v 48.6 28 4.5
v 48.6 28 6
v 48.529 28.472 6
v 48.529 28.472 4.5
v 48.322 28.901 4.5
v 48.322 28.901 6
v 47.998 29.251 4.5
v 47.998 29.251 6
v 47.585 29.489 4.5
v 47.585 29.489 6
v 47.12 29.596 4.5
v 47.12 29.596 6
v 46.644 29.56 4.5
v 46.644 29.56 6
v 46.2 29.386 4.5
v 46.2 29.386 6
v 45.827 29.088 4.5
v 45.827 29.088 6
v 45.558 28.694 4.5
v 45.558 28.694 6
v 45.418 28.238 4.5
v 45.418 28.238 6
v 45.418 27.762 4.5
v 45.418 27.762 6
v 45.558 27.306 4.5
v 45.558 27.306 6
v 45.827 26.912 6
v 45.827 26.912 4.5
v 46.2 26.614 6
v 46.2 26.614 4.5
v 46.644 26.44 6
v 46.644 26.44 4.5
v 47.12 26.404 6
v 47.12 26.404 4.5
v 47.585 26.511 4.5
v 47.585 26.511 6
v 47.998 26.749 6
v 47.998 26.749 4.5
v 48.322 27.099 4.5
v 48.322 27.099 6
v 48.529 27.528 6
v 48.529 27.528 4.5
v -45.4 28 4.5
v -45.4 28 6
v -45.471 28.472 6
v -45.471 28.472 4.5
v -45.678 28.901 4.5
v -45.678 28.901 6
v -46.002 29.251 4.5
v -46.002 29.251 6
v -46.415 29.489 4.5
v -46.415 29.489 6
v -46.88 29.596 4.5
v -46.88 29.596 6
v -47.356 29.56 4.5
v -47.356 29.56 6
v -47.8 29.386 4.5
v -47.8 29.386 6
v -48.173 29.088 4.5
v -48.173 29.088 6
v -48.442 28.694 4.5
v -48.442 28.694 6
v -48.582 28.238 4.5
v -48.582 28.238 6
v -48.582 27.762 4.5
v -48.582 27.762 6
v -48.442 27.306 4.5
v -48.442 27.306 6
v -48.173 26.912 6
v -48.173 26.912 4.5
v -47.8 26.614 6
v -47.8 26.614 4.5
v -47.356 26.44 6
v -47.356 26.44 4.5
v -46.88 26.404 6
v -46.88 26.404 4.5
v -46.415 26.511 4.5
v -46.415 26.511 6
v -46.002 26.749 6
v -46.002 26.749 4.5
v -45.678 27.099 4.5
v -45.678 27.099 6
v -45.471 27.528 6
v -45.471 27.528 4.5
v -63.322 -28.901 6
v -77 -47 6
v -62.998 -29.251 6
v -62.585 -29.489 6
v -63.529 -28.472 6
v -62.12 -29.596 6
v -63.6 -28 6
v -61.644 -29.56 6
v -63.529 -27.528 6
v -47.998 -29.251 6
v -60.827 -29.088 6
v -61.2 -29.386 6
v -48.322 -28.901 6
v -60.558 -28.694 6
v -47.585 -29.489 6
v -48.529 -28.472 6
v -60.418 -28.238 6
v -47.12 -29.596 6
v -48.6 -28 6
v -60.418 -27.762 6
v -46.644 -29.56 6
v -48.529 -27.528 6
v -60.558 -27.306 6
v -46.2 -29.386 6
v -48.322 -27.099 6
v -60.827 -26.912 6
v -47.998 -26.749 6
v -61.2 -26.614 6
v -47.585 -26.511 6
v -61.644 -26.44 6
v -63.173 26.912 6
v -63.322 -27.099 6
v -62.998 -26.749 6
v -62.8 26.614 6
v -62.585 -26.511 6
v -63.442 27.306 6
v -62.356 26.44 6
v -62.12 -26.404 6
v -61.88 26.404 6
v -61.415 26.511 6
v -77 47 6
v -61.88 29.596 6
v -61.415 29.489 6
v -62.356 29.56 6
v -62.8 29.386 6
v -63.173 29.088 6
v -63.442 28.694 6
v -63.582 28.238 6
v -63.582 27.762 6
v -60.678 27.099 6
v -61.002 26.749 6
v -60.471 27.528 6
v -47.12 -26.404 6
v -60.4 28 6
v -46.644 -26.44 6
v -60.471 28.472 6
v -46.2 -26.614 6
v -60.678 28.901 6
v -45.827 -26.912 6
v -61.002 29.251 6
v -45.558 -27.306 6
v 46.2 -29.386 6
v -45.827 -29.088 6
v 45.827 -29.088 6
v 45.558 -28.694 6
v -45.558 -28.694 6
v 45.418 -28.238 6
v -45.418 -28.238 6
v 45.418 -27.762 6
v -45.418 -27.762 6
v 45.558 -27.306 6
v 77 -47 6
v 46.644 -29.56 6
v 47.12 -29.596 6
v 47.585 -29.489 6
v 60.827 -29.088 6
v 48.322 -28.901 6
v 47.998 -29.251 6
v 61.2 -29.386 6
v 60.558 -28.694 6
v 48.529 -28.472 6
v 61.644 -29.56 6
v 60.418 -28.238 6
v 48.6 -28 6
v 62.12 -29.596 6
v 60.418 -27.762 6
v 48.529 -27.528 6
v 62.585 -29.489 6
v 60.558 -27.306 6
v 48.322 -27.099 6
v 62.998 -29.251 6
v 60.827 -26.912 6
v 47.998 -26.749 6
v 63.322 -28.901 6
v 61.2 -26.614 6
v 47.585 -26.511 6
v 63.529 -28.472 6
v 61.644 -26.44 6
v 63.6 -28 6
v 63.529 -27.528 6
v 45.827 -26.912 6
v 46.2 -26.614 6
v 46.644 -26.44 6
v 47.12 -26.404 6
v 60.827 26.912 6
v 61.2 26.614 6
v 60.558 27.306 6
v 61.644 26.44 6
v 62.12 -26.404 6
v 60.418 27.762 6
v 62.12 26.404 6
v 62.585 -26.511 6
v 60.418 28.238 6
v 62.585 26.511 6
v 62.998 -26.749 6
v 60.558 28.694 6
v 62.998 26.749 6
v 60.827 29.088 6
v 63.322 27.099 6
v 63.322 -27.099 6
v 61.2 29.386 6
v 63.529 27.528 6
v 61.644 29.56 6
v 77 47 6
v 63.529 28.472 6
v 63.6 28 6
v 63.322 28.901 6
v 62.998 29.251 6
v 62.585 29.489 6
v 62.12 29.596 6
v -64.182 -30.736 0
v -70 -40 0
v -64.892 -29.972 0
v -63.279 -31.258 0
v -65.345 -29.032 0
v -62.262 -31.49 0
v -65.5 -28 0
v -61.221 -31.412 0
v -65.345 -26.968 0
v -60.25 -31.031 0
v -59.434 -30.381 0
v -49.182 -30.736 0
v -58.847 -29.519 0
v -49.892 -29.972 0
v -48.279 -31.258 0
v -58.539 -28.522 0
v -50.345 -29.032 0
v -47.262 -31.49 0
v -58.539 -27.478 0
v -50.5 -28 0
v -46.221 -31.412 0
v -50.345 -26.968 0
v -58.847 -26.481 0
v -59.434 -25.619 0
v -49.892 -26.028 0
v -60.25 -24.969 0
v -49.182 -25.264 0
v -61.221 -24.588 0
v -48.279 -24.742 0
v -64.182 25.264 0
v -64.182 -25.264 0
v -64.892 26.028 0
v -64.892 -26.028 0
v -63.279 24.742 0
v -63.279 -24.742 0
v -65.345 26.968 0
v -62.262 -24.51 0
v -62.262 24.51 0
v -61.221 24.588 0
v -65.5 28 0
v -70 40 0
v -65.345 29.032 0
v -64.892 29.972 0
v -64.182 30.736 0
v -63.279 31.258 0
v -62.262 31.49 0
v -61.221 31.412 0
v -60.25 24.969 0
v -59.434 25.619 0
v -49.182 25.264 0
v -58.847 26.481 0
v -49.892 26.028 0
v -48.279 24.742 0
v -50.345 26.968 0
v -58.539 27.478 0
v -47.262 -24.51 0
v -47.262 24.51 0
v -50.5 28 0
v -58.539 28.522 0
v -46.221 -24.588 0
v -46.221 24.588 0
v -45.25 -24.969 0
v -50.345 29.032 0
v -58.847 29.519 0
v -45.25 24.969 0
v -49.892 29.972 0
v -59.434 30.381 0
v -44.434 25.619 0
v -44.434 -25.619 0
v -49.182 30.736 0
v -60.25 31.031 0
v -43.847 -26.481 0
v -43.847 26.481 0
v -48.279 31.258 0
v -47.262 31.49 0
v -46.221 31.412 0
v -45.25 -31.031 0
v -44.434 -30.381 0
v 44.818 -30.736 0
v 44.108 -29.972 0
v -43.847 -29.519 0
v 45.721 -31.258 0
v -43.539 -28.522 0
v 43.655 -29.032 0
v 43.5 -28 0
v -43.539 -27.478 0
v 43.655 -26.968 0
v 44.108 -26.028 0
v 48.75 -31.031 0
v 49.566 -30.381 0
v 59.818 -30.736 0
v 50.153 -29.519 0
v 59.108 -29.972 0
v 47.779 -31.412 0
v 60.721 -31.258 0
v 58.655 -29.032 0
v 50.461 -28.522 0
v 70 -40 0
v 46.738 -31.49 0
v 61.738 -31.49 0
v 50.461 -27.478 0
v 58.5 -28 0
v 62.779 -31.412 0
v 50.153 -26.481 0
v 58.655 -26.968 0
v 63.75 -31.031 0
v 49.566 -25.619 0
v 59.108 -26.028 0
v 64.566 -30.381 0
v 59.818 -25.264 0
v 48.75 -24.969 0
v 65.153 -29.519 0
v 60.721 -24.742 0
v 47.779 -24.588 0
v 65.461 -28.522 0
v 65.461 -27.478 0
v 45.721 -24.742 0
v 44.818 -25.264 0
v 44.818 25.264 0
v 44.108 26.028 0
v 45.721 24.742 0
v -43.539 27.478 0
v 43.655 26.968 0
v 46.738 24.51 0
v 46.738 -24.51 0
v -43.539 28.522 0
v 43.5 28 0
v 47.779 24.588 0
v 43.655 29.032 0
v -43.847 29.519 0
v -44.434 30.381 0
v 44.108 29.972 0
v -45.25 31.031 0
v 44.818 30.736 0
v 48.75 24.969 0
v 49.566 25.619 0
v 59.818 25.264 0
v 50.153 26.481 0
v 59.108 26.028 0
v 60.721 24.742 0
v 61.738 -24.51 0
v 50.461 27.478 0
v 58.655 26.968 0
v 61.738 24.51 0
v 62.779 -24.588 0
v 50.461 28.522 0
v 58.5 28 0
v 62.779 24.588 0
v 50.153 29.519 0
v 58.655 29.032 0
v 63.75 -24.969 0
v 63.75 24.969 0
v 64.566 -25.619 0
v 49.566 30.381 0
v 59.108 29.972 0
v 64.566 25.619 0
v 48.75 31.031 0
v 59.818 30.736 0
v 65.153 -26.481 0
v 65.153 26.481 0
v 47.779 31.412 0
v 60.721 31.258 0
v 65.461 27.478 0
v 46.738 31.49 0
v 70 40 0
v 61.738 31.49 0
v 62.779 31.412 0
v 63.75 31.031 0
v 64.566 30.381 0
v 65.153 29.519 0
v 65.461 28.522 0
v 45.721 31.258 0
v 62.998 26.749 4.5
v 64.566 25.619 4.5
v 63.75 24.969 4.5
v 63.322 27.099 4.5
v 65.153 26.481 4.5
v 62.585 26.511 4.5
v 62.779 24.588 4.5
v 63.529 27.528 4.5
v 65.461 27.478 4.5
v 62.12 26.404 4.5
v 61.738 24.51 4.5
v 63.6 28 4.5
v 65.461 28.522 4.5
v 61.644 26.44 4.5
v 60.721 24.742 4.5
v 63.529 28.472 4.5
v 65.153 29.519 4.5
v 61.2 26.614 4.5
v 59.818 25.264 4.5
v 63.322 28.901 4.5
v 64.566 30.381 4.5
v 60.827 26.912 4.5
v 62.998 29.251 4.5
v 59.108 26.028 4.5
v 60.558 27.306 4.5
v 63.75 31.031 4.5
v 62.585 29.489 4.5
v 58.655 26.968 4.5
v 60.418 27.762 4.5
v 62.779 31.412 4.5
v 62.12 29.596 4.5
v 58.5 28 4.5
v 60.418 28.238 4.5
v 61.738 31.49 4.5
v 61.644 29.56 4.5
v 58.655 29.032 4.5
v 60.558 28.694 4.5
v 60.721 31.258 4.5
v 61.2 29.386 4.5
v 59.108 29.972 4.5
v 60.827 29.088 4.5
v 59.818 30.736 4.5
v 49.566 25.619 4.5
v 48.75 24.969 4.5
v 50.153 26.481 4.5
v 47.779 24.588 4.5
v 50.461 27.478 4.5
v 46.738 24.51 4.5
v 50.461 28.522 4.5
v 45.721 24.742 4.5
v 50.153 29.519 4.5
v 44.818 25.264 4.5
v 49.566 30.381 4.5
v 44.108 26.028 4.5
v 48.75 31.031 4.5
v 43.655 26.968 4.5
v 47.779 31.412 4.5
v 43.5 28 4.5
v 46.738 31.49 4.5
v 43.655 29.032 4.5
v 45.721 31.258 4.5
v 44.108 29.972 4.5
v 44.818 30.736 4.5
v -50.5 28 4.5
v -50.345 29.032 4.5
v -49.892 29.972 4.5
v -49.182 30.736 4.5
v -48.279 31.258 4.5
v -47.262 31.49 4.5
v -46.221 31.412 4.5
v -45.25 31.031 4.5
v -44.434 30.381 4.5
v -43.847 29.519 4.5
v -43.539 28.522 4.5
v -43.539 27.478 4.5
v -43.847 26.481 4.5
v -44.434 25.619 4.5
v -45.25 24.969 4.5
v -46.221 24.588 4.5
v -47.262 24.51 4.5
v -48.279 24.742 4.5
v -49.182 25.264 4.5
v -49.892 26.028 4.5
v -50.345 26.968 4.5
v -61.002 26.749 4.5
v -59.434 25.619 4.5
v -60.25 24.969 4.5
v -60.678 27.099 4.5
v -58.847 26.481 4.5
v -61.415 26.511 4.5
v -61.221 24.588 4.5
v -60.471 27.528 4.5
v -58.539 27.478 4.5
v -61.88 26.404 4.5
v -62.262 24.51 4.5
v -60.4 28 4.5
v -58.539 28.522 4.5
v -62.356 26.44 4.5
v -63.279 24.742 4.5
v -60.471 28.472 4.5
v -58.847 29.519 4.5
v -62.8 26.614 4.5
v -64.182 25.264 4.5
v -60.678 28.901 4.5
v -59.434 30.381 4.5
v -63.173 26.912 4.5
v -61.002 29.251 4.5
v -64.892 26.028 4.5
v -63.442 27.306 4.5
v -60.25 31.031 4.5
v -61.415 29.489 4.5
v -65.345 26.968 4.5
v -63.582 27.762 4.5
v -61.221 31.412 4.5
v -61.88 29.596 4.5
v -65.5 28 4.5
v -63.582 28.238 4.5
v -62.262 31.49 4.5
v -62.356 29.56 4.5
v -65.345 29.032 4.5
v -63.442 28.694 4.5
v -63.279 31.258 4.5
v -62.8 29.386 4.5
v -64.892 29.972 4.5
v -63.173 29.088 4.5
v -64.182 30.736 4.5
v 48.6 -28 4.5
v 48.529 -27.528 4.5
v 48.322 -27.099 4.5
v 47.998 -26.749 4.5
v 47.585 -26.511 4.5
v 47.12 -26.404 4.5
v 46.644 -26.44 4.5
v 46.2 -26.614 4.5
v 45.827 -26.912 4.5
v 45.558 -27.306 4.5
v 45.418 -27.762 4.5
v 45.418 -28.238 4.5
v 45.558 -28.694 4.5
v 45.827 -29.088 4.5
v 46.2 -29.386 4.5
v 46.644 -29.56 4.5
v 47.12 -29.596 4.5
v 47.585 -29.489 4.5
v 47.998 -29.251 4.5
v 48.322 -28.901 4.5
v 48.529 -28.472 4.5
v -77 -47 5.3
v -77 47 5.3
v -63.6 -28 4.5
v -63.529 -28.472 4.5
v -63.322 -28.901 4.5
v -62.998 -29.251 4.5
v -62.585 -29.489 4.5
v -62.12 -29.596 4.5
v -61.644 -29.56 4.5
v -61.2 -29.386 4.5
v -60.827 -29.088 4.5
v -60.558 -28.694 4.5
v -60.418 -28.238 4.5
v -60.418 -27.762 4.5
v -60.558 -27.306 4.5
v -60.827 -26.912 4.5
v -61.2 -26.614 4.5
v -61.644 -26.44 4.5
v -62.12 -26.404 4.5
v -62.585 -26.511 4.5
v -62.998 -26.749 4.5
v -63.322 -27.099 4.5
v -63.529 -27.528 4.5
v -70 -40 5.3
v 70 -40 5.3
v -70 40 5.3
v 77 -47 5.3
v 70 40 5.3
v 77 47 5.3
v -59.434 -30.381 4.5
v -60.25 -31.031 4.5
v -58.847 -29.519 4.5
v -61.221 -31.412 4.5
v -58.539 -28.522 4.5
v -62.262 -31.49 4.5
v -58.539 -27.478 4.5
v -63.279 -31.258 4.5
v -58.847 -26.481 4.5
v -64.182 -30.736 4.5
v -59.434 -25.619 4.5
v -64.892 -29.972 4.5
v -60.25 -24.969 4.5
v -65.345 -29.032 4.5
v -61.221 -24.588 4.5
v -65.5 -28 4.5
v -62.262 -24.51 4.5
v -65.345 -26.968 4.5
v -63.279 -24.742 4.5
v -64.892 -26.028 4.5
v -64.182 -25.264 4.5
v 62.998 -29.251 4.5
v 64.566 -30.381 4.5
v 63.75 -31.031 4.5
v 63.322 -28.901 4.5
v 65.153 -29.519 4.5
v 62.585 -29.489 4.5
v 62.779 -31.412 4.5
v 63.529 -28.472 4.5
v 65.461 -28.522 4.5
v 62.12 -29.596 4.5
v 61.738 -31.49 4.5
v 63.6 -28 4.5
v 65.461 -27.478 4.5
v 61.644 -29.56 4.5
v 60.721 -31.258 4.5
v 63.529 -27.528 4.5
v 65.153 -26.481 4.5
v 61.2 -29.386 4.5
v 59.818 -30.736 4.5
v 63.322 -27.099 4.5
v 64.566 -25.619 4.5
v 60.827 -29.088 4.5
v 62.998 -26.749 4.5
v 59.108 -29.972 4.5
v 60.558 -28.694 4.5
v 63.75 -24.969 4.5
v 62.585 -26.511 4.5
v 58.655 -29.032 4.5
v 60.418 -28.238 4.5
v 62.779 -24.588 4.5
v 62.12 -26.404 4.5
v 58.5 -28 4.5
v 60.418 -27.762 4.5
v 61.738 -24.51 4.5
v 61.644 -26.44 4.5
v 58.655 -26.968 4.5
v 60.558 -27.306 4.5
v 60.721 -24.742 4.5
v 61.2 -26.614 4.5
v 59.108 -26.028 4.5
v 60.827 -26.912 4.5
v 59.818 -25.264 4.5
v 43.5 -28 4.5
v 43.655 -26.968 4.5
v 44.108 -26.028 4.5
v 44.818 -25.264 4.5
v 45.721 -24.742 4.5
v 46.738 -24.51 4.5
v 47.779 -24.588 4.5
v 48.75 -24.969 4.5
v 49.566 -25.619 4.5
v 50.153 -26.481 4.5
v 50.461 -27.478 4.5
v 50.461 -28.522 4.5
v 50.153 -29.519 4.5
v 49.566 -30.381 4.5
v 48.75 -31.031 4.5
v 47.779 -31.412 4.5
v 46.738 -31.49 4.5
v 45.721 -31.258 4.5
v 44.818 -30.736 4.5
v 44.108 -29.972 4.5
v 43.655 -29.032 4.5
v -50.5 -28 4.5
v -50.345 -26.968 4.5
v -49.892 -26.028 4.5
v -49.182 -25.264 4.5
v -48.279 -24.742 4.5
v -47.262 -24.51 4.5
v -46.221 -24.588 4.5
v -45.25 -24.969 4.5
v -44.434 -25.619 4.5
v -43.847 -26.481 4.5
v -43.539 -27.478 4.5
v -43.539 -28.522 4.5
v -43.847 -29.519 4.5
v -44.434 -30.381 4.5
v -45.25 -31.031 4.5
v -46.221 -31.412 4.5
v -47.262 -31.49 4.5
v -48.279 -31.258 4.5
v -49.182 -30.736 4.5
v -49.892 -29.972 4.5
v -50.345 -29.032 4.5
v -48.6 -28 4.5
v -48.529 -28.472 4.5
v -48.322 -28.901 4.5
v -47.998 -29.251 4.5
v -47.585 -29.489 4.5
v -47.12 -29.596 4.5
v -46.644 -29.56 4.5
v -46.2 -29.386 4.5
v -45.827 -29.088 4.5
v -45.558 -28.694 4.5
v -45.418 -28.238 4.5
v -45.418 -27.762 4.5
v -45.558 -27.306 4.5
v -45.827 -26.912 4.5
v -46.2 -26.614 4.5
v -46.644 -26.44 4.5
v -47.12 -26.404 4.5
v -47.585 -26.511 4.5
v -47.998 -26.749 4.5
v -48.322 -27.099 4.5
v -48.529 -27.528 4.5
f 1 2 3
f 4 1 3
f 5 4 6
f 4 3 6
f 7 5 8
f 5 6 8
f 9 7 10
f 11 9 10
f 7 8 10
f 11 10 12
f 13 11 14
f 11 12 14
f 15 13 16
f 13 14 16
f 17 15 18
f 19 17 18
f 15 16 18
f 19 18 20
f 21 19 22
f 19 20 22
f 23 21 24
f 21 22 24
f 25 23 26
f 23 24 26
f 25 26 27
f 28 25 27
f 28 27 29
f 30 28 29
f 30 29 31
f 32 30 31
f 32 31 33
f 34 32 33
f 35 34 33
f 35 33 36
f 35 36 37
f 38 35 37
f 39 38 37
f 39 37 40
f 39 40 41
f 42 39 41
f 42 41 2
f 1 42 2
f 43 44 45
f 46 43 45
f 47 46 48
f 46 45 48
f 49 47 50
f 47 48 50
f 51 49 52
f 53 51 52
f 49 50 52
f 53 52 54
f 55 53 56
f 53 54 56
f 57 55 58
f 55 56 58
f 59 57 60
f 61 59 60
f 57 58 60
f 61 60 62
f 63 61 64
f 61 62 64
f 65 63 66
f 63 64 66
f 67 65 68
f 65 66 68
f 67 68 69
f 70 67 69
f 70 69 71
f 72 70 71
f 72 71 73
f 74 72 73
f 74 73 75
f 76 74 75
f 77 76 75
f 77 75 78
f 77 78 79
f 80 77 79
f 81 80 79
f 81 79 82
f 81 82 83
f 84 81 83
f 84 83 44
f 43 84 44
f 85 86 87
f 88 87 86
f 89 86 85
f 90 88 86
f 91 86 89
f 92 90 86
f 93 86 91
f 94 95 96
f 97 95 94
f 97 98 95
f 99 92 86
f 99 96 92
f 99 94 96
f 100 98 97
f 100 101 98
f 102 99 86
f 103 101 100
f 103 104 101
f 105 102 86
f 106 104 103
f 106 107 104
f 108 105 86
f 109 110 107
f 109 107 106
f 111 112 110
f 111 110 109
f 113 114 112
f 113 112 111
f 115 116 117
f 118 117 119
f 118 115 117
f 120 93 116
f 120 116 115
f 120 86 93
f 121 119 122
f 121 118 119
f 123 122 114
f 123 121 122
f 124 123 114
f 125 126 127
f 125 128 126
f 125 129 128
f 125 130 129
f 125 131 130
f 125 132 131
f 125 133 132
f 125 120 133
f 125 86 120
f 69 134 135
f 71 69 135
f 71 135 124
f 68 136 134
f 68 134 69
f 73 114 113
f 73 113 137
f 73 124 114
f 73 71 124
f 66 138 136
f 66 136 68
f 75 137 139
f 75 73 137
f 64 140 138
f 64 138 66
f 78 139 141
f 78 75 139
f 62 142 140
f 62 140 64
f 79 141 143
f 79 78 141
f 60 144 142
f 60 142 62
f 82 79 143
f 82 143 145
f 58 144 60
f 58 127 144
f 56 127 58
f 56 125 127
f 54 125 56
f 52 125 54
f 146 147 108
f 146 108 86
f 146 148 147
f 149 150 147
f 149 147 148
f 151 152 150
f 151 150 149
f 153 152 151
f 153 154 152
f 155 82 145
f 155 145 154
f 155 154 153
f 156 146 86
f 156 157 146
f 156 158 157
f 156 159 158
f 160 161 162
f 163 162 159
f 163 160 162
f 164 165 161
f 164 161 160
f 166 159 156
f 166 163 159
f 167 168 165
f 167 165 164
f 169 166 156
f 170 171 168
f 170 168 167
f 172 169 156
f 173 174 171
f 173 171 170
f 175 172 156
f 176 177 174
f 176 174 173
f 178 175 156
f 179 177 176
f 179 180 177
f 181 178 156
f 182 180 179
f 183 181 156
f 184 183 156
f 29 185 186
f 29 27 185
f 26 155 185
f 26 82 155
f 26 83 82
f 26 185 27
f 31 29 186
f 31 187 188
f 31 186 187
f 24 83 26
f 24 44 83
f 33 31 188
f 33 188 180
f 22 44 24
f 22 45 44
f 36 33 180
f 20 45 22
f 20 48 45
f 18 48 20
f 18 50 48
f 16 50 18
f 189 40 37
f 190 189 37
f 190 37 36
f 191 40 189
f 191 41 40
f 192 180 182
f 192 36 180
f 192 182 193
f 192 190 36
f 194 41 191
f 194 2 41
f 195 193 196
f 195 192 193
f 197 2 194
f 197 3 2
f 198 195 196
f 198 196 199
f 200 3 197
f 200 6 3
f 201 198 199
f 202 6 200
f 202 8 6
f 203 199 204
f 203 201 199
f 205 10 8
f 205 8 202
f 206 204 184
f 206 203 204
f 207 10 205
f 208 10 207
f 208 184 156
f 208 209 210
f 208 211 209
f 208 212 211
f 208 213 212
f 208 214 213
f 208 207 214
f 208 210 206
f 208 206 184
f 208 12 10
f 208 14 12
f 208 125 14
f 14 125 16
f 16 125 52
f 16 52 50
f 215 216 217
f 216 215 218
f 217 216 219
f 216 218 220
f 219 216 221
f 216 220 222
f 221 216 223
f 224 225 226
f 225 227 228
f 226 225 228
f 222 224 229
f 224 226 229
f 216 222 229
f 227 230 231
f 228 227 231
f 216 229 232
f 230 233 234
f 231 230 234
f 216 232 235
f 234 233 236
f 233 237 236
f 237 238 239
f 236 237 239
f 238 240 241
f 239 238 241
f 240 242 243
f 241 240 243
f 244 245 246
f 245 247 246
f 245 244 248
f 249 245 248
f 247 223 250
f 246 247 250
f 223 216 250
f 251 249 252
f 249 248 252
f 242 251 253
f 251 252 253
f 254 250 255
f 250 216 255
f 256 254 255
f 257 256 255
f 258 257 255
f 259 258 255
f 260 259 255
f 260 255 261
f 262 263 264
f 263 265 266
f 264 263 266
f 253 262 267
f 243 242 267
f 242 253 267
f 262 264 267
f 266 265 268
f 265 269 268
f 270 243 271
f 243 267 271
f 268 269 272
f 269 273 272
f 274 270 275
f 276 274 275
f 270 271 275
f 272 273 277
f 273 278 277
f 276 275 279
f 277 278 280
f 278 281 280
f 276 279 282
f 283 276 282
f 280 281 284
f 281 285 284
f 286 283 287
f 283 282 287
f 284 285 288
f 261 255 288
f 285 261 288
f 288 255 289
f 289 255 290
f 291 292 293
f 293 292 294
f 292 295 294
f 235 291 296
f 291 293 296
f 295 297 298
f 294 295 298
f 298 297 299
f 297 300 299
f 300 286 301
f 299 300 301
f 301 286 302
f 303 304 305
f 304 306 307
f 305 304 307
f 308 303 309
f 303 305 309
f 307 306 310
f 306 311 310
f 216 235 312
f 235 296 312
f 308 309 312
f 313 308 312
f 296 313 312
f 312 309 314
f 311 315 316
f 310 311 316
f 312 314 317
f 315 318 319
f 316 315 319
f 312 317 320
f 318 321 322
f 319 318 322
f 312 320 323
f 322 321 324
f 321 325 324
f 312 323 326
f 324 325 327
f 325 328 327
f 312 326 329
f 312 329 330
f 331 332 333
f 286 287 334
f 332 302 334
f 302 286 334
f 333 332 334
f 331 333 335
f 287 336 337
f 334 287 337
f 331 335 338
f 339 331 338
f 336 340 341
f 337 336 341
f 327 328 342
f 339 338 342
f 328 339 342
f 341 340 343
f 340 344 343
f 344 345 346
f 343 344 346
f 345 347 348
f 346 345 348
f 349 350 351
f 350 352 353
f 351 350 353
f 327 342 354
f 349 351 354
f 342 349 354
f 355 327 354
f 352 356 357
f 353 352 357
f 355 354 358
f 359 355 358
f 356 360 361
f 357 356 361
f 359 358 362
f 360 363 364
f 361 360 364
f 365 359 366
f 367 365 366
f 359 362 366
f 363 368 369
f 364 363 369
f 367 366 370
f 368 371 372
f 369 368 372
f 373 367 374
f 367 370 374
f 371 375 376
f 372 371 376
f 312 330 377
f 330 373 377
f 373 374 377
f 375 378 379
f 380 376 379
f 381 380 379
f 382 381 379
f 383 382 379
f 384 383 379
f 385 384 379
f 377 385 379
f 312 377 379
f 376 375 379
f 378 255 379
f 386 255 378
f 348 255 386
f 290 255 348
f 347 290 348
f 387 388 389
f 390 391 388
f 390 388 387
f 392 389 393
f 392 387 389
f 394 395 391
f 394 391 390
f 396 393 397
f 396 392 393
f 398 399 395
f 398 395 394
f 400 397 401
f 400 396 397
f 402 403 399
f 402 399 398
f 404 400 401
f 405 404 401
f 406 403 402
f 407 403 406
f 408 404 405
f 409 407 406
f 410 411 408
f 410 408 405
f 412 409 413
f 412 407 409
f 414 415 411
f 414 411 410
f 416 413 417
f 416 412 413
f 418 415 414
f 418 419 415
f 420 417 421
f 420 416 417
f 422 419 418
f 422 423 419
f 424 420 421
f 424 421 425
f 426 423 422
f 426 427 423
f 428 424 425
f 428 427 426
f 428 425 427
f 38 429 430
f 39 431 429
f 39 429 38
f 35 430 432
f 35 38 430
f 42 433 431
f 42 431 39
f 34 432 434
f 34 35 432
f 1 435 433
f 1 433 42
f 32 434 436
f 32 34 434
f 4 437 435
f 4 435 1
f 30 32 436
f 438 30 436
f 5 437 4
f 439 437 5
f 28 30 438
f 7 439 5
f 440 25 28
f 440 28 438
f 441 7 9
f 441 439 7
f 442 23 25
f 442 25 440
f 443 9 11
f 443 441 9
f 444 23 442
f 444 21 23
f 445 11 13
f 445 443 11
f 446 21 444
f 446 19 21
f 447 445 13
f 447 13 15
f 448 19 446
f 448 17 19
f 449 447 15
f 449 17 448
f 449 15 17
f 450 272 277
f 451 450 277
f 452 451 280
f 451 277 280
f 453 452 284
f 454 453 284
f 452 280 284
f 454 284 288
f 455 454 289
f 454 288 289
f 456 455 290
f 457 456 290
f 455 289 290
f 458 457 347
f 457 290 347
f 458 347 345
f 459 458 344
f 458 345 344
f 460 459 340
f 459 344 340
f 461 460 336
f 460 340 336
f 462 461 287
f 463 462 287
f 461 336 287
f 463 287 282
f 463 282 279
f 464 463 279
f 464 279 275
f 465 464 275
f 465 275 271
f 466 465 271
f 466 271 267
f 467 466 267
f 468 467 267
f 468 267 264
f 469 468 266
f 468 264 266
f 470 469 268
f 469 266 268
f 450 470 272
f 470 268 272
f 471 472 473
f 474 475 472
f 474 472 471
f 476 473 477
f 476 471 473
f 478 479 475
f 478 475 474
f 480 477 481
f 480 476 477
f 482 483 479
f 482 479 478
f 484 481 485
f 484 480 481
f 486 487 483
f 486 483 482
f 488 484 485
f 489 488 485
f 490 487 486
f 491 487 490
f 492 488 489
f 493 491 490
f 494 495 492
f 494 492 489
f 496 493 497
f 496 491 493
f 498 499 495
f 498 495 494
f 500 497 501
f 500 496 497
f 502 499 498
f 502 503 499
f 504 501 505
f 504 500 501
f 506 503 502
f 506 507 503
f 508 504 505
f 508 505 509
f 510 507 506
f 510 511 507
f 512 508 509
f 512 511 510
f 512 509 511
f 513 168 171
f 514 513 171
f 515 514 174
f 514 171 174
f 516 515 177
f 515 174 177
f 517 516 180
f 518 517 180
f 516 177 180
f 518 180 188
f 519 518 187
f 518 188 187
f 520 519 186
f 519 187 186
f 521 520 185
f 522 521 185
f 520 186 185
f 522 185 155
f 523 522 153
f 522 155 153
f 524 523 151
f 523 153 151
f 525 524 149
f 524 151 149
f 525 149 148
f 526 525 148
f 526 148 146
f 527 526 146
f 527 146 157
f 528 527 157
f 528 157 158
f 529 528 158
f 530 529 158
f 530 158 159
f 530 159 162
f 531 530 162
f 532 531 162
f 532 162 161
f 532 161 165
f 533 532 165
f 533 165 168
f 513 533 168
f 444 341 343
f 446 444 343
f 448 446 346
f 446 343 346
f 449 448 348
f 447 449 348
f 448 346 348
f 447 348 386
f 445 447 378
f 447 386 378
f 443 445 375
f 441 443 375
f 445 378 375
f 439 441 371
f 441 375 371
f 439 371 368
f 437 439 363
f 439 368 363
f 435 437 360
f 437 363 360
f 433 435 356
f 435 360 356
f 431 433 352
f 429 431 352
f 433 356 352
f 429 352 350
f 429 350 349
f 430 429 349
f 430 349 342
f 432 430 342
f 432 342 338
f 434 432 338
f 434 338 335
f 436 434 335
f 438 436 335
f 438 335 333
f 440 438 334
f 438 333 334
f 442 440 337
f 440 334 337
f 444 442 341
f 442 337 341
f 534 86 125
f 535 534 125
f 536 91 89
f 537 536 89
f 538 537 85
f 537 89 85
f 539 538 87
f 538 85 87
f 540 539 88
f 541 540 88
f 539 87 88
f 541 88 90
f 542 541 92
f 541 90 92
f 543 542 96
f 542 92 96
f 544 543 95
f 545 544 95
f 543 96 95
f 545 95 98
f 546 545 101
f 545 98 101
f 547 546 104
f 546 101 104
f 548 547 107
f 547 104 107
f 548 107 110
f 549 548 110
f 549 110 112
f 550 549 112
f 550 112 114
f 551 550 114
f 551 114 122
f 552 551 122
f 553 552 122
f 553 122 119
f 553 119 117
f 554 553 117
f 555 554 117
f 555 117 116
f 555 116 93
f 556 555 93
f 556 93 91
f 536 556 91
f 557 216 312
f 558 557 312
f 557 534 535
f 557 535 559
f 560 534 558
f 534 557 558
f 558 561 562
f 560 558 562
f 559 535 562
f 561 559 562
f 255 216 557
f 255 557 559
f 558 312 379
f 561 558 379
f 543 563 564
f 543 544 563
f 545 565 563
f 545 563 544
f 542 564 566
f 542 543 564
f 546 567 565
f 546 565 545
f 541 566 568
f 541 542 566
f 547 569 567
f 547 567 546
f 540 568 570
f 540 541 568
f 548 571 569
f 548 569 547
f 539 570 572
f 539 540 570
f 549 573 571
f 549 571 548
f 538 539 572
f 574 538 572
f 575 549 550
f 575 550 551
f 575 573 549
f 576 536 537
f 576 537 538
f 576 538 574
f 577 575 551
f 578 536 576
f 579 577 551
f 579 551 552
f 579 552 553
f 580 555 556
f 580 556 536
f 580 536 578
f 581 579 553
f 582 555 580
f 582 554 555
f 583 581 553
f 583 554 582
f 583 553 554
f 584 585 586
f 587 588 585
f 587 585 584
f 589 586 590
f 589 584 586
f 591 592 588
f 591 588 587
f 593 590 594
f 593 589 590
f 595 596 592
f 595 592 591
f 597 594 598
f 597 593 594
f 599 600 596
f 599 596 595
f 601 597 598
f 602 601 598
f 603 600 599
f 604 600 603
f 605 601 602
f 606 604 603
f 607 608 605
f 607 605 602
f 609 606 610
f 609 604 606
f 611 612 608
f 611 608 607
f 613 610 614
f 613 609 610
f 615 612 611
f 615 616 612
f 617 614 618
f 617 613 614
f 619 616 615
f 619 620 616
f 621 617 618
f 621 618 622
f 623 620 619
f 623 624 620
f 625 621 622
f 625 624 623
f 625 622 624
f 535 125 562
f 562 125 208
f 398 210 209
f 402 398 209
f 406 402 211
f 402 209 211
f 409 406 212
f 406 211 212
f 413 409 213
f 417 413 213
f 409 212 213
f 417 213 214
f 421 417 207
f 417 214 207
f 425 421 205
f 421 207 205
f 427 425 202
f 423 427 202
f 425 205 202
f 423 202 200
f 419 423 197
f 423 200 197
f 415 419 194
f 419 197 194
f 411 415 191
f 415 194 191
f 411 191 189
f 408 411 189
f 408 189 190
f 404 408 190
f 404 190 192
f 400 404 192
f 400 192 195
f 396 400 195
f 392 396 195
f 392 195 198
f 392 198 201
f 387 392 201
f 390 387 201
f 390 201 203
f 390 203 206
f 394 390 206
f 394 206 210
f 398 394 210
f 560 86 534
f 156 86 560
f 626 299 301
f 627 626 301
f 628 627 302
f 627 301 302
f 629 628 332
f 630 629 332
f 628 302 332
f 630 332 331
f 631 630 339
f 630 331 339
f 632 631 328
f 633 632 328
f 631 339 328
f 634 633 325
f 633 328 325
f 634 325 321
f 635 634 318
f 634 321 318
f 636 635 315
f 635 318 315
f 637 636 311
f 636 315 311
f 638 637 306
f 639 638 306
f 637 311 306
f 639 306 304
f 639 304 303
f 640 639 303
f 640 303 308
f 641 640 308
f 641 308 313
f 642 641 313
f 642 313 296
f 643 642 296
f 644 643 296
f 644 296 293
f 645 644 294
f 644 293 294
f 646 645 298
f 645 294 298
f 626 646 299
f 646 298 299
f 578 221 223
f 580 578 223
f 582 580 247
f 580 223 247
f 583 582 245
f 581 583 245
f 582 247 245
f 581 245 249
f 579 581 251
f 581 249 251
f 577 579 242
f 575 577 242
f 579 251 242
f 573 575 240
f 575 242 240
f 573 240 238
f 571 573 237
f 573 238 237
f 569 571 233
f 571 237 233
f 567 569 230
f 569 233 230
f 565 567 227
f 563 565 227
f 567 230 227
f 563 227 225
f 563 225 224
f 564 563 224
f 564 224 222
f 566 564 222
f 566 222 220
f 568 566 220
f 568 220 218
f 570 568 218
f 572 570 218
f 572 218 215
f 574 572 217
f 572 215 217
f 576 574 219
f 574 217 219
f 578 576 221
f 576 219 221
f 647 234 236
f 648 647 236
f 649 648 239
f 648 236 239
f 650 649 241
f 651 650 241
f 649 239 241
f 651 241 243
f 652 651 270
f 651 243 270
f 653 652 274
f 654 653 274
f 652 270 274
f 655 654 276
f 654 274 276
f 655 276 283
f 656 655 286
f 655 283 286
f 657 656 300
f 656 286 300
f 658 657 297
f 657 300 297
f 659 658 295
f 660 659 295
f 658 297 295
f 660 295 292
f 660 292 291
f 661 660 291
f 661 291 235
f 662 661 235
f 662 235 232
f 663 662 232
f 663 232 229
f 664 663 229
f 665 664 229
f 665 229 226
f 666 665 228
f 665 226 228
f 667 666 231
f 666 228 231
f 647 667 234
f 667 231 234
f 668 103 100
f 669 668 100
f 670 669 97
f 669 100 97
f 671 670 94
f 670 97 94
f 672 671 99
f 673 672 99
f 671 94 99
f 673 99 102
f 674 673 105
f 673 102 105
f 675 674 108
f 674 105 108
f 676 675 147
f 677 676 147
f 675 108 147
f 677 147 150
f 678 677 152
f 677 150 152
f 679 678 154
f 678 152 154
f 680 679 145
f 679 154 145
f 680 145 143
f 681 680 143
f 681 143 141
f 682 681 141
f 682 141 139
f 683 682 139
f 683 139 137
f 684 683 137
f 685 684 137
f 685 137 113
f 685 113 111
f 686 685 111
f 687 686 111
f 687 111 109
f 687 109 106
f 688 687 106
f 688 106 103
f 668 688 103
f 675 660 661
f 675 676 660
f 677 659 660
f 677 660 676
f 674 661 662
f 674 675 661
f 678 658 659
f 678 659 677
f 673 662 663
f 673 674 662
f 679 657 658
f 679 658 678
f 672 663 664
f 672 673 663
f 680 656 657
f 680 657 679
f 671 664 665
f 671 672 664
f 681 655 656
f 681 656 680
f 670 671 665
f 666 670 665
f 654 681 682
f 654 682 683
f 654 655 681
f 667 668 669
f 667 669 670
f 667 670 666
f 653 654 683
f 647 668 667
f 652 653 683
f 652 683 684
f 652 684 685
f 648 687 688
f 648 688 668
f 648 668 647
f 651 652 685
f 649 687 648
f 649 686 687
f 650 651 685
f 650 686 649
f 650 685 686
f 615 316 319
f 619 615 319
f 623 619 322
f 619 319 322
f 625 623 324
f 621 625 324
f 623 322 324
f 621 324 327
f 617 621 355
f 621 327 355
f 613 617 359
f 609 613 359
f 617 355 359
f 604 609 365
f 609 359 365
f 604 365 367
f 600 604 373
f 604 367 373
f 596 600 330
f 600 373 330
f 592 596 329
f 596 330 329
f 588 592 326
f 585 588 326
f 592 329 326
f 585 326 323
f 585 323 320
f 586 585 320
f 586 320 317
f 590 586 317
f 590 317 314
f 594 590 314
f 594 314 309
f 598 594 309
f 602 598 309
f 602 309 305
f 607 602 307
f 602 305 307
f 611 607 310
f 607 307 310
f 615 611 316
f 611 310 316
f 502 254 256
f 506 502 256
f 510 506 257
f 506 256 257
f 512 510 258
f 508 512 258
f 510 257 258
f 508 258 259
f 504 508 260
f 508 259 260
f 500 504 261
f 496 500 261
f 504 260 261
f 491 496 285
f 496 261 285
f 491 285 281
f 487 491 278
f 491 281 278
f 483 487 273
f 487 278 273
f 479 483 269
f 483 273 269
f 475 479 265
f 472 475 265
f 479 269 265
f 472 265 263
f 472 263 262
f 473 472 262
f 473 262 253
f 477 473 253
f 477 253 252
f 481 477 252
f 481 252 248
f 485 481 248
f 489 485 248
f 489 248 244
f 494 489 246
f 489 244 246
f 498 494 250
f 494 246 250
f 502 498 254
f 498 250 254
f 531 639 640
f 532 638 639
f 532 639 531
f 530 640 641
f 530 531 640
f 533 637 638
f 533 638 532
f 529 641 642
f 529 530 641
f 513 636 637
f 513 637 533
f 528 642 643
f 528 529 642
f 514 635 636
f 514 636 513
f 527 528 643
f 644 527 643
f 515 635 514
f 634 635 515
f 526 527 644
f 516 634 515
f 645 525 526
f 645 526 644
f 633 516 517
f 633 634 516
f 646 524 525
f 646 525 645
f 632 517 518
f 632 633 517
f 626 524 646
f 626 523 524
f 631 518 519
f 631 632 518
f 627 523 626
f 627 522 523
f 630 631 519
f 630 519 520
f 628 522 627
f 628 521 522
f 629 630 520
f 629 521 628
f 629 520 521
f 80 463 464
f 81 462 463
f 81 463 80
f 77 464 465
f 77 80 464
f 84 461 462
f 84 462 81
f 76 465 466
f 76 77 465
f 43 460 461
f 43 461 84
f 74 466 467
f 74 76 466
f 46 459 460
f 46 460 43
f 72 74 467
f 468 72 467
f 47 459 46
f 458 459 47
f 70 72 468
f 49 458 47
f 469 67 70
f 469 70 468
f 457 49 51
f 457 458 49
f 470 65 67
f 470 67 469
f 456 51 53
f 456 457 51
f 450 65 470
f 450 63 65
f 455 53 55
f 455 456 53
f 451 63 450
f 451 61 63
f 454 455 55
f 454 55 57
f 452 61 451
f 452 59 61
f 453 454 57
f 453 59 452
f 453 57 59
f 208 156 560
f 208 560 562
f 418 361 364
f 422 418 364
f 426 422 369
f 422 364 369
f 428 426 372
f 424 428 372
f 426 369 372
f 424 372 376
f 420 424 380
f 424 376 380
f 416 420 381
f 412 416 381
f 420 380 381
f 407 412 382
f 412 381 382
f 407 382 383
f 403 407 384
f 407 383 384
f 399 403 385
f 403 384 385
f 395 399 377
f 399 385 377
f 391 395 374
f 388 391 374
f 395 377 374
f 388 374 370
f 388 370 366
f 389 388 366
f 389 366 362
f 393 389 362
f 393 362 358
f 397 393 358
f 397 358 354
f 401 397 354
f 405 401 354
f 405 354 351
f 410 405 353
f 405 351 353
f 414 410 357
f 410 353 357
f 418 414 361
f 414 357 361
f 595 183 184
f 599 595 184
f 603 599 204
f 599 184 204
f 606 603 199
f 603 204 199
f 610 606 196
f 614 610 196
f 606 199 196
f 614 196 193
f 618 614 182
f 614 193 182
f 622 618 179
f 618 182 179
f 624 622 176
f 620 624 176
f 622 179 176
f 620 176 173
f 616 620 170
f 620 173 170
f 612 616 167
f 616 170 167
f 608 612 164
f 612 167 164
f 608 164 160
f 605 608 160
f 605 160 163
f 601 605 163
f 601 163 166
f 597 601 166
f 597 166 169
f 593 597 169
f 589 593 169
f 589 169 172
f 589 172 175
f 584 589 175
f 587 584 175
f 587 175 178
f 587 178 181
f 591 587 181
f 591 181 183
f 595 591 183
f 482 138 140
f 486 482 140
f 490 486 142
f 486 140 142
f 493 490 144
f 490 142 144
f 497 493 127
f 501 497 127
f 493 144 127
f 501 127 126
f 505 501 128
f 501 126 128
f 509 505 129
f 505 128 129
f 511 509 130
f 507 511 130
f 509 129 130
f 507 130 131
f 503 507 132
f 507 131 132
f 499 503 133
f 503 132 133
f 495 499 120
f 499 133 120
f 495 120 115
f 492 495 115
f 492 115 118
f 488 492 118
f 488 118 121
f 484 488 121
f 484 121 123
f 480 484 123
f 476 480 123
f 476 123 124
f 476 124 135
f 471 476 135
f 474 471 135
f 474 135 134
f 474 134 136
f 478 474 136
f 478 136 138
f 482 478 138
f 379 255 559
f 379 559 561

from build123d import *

# Parameters (mm, degrees)
SKETCH1_W           = 140
SKETCH1_H           = 80
BOSS_EXTRUDE1_DEPTH = 6
SKETCH2_R           = 1.6
CUT_EXTRUDE1_DEPTH  = 81.845531726
SKETCH3_R           = 3.5
CUT_EXTRUDE2_DEPTH  = 4.5
SKETCH4_W           = 154
SKETCH4_H           = 94
SKETCH4_W_2         = 140
SKETCH4_H_2         = 80
BOSS_EXTRUDE2_DEPTH = 0.7


with BuildPart() as part:
    # Sketch1 → Boss-Extrude1 (new body)
    with BuildSketch(Plane.XY):
        Rectangle(SKETCH1_W, SKETCH1_H)
    extrude(amount=BOSS_EXTRUDE1_DEPTH)

    # Sketch2 → Cut-Extrude1 (cut, through all)
    with BuildSketch(Plane.XY.offset(6)):
        with Locations((-62, 28)):
            Circle(SKETCH2_R)
        with Locations((-47, 28)):
            Circle(SKETCH2_R)
        with Locations((47, 28)):
            Circle(SKETCH2_R)
        with Locations((62, 28)):
            Circle(SKETCH2_R)
        with Locations((47, -28)):
            Circle(SKETCH2_R)
        with Locations((62, -28)):
            Circle(SKETCH2_R)
        with Locations(Location((-62, -28, 0), (0, 0, 180))):
            Circle(SKETCH2_R)
        with Locations(Location((-47, -28, 0), (0, 0, 180))):
            Circle(SKETCH2_R)
    extrude(amount=-CUT_EXTRUDE1_DEPTH, mode=Mode.SUBTRACT)

    # Sketch3 → Cut-Extrude2 (cut)
    with BuildSketch(Plane(origin=(0, 0, 0), x_dir=(-1, 0, 0), z_dir=(0, 0, -1))):
        with Locations((62, 28)):
            Circle(SKETCH3_R)
        with Locations((47, 28)):
            Circle(SKETCH3_R)
        with Locations((-47, 28)):
            Circle(SKETCH3_R)
        with Locations((-62, 28)):
            Circle(SKETCH3_R)
        with Locations((-47, -28)):
            Circle(SKETCH3_R)
        with Locations((-62, -28)):
            Circle(SKETCH3_R)
        with Locations((62, -28)):
            Circle(SKETCH3_R)
        with Locations((47, -28)):
            Circle(SKETCH3_R)
    extrude(amount=-CUT_EXTRUDE2_DEPTH, mode=Mode.SUBTRACT)

    # Sketch4 → Boss-Extrude2 (add)
    with BuildSketch(Plane.XY.offset(6)):
        Rectangle(SKETCH4_W, SKETCH4_H)
        Rectangle(SKETCH4_W_2, SKETCH4_H_2, mode=Mode.SUBTRACT)
    extrude(amount=-BOSS_EXTRUDE2_DEPTH)


solid = part.part
